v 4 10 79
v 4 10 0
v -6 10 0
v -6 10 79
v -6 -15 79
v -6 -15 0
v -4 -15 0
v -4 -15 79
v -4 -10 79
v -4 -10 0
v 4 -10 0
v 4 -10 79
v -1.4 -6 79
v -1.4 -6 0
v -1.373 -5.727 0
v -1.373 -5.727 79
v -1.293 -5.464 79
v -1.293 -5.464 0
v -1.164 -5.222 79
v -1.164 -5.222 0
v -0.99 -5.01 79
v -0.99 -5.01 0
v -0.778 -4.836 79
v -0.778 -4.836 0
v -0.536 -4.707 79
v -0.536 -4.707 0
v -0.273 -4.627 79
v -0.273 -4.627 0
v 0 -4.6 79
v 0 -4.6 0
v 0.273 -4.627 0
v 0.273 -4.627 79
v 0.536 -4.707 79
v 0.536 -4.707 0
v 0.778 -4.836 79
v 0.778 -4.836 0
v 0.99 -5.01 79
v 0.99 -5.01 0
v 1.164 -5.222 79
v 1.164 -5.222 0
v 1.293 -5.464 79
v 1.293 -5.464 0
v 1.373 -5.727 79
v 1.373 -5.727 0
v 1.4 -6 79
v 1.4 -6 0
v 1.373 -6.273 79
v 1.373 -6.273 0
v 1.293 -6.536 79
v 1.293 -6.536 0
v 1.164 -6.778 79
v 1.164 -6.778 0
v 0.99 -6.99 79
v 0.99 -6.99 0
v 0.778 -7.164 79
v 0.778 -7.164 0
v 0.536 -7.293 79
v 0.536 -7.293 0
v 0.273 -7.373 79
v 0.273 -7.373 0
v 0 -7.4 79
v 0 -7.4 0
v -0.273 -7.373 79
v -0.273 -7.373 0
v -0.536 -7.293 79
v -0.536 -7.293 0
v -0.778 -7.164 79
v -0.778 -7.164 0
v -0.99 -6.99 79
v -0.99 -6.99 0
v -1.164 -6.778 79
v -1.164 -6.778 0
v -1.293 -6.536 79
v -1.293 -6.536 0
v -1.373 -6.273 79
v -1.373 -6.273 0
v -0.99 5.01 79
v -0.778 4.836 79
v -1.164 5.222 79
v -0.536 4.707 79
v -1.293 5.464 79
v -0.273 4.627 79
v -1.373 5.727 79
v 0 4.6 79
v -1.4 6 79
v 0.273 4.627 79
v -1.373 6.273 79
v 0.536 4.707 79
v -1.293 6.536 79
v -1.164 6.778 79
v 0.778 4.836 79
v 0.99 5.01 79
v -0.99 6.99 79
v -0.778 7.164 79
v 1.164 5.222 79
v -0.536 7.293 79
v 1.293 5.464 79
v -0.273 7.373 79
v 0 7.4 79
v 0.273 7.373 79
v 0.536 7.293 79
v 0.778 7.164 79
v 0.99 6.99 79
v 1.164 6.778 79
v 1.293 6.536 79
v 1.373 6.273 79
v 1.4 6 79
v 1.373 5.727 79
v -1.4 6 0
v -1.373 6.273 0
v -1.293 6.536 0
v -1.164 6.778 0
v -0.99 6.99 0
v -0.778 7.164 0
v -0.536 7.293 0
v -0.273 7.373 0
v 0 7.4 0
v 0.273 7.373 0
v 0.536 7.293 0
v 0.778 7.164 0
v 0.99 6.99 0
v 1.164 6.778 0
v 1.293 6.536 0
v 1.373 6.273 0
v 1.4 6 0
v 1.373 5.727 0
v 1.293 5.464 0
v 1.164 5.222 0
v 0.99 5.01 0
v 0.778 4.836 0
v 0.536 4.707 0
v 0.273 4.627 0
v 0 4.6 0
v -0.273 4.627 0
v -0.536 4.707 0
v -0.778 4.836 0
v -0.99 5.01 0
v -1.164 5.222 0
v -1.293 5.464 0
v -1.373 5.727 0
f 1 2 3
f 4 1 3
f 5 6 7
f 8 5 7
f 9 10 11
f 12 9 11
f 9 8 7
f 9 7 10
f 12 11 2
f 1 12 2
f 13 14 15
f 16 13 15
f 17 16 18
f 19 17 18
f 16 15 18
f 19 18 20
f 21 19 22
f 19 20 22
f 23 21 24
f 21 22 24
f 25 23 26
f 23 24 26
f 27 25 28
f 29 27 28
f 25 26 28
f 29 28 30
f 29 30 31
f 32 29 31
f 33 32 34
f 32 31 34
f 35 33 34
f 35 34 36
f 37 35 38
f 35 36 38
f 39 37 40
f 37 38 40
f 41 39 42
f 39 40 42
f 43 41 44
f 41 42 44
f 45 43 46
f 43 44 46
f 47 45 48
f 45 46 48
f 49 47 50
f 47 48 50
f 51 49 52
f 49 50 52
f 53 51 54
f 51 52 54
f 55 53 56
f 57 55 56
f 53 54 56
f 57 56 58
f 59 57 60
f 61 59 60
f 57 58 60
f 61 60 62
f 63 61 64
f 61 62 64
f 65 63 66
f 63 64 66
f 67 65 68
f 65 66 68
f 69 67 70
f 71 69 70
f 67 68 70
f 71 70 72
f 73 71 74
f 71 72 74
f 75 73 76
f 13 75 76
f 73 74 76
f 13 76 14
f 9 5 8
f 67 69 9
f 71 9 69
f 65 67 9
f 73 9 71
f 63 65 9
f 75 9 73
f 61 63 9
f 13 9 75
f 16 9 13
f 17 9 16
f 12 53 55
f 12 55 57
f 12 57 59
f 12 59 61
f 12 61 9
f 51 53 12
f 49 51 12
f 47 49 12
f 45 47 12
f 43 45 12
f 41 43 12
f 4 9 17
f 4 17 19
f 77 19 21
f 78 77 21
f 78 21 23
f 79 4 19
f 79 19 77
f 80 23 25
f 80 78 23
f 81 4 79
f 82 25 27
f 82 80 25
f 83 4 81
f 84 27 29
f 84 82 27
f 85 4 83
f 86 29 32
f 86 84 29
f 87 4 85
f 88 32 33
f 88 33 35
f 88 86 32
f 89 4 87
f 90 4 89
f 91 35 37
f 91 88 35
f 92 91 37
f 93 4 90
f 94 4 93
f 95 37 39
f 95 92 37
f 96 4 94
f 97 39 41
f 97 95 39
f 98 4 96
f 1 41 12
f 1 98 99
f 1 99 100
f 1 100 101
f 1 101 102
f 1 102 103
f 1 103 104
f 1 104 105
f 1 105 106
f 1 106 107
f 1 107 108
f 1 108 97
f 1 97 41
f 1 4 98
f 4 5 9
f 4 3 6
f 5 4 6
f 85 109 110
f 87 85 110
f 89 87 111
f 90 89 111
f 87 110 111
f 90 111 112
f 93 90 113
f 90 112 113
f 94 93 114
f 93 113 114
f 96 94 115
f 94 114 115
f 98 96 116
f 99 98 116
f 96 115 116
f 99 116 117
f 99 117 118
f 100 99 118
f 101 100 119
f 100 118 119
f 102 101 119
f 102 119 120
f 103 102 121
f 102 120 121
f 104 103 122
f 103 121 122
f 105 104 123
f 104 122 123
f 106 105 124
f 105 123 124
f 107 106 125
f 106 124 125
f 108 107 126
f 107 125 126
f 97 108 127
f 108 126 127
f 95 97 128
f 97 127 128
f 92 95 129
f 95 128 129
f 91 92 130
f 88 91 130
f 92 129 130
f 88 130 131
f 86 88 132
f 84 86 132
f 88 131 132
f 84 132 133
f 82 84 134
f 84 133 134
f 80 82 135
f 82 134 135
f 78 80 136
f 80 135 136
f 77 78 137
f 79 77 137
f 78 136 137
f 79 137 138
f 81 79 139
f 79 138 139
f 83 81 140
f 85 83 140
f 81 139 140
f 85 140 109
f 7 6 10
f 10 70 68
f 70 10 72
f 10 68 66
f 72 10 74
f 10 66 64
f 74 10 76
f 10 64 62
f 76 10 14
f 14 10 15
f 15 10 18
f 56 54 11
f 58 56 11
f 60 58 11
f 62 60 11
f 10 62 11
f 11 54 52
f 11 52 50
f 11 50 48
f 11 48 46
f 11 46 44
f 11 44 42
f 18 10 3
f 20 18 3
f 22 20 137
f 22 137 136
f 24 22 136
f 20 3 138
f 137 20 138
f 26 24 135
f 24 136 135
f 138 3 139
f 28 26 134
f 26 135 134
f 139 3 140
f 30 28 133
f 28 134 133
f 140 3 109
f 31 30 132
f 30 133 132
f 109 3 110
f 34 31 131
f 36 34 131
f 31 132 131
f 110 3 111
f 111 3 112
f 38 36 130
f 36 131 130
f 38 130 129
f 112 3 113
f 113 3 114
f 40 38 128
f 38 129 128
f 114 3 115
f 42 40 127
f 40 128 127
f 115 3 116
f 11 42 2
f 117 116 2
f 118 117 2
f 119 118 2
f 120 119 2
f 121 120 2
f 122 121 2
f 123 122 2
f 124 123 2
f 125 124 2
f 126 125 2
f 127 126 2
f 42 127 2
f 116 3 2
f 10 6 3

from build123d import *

# Parameters (mm, degrees)
BOSS_EXTRUDE1_DEPTH = 79
SKETCH2_R           = 1.4
CUT_EXTRUDE1_DEPTH  = 79


with BuildPart() as part:
    # Sketch1 → Boss-Extrude1 (new body)
    with BuildSketch(Plane.XY):
        Polygon((-4, 10), (-6, 10), (-6, -15), (-4, -15), (-4, -10), (4, -10), (4, 10), align=None)
    extrude(amount=BOSS_EXTRUDE1_DEPTH)

    # Sketch2 → Cut-Extrude1 (cut)
    with BuildSketch(Plane(origin=(0, 0, 0), x_dir=(-1, 0, 0), z_dir=(0, 0, -1))):
        with Locations((0, 6)):
            Circle(SKETCH2_R)
        with Locations((0, -6)):
            Circle(SKETCH2_R)
    extrude(amount=-CUT_EXTRUDE1_DEPTH, mode=Mode.SUBTRACT)


solid = part.part
